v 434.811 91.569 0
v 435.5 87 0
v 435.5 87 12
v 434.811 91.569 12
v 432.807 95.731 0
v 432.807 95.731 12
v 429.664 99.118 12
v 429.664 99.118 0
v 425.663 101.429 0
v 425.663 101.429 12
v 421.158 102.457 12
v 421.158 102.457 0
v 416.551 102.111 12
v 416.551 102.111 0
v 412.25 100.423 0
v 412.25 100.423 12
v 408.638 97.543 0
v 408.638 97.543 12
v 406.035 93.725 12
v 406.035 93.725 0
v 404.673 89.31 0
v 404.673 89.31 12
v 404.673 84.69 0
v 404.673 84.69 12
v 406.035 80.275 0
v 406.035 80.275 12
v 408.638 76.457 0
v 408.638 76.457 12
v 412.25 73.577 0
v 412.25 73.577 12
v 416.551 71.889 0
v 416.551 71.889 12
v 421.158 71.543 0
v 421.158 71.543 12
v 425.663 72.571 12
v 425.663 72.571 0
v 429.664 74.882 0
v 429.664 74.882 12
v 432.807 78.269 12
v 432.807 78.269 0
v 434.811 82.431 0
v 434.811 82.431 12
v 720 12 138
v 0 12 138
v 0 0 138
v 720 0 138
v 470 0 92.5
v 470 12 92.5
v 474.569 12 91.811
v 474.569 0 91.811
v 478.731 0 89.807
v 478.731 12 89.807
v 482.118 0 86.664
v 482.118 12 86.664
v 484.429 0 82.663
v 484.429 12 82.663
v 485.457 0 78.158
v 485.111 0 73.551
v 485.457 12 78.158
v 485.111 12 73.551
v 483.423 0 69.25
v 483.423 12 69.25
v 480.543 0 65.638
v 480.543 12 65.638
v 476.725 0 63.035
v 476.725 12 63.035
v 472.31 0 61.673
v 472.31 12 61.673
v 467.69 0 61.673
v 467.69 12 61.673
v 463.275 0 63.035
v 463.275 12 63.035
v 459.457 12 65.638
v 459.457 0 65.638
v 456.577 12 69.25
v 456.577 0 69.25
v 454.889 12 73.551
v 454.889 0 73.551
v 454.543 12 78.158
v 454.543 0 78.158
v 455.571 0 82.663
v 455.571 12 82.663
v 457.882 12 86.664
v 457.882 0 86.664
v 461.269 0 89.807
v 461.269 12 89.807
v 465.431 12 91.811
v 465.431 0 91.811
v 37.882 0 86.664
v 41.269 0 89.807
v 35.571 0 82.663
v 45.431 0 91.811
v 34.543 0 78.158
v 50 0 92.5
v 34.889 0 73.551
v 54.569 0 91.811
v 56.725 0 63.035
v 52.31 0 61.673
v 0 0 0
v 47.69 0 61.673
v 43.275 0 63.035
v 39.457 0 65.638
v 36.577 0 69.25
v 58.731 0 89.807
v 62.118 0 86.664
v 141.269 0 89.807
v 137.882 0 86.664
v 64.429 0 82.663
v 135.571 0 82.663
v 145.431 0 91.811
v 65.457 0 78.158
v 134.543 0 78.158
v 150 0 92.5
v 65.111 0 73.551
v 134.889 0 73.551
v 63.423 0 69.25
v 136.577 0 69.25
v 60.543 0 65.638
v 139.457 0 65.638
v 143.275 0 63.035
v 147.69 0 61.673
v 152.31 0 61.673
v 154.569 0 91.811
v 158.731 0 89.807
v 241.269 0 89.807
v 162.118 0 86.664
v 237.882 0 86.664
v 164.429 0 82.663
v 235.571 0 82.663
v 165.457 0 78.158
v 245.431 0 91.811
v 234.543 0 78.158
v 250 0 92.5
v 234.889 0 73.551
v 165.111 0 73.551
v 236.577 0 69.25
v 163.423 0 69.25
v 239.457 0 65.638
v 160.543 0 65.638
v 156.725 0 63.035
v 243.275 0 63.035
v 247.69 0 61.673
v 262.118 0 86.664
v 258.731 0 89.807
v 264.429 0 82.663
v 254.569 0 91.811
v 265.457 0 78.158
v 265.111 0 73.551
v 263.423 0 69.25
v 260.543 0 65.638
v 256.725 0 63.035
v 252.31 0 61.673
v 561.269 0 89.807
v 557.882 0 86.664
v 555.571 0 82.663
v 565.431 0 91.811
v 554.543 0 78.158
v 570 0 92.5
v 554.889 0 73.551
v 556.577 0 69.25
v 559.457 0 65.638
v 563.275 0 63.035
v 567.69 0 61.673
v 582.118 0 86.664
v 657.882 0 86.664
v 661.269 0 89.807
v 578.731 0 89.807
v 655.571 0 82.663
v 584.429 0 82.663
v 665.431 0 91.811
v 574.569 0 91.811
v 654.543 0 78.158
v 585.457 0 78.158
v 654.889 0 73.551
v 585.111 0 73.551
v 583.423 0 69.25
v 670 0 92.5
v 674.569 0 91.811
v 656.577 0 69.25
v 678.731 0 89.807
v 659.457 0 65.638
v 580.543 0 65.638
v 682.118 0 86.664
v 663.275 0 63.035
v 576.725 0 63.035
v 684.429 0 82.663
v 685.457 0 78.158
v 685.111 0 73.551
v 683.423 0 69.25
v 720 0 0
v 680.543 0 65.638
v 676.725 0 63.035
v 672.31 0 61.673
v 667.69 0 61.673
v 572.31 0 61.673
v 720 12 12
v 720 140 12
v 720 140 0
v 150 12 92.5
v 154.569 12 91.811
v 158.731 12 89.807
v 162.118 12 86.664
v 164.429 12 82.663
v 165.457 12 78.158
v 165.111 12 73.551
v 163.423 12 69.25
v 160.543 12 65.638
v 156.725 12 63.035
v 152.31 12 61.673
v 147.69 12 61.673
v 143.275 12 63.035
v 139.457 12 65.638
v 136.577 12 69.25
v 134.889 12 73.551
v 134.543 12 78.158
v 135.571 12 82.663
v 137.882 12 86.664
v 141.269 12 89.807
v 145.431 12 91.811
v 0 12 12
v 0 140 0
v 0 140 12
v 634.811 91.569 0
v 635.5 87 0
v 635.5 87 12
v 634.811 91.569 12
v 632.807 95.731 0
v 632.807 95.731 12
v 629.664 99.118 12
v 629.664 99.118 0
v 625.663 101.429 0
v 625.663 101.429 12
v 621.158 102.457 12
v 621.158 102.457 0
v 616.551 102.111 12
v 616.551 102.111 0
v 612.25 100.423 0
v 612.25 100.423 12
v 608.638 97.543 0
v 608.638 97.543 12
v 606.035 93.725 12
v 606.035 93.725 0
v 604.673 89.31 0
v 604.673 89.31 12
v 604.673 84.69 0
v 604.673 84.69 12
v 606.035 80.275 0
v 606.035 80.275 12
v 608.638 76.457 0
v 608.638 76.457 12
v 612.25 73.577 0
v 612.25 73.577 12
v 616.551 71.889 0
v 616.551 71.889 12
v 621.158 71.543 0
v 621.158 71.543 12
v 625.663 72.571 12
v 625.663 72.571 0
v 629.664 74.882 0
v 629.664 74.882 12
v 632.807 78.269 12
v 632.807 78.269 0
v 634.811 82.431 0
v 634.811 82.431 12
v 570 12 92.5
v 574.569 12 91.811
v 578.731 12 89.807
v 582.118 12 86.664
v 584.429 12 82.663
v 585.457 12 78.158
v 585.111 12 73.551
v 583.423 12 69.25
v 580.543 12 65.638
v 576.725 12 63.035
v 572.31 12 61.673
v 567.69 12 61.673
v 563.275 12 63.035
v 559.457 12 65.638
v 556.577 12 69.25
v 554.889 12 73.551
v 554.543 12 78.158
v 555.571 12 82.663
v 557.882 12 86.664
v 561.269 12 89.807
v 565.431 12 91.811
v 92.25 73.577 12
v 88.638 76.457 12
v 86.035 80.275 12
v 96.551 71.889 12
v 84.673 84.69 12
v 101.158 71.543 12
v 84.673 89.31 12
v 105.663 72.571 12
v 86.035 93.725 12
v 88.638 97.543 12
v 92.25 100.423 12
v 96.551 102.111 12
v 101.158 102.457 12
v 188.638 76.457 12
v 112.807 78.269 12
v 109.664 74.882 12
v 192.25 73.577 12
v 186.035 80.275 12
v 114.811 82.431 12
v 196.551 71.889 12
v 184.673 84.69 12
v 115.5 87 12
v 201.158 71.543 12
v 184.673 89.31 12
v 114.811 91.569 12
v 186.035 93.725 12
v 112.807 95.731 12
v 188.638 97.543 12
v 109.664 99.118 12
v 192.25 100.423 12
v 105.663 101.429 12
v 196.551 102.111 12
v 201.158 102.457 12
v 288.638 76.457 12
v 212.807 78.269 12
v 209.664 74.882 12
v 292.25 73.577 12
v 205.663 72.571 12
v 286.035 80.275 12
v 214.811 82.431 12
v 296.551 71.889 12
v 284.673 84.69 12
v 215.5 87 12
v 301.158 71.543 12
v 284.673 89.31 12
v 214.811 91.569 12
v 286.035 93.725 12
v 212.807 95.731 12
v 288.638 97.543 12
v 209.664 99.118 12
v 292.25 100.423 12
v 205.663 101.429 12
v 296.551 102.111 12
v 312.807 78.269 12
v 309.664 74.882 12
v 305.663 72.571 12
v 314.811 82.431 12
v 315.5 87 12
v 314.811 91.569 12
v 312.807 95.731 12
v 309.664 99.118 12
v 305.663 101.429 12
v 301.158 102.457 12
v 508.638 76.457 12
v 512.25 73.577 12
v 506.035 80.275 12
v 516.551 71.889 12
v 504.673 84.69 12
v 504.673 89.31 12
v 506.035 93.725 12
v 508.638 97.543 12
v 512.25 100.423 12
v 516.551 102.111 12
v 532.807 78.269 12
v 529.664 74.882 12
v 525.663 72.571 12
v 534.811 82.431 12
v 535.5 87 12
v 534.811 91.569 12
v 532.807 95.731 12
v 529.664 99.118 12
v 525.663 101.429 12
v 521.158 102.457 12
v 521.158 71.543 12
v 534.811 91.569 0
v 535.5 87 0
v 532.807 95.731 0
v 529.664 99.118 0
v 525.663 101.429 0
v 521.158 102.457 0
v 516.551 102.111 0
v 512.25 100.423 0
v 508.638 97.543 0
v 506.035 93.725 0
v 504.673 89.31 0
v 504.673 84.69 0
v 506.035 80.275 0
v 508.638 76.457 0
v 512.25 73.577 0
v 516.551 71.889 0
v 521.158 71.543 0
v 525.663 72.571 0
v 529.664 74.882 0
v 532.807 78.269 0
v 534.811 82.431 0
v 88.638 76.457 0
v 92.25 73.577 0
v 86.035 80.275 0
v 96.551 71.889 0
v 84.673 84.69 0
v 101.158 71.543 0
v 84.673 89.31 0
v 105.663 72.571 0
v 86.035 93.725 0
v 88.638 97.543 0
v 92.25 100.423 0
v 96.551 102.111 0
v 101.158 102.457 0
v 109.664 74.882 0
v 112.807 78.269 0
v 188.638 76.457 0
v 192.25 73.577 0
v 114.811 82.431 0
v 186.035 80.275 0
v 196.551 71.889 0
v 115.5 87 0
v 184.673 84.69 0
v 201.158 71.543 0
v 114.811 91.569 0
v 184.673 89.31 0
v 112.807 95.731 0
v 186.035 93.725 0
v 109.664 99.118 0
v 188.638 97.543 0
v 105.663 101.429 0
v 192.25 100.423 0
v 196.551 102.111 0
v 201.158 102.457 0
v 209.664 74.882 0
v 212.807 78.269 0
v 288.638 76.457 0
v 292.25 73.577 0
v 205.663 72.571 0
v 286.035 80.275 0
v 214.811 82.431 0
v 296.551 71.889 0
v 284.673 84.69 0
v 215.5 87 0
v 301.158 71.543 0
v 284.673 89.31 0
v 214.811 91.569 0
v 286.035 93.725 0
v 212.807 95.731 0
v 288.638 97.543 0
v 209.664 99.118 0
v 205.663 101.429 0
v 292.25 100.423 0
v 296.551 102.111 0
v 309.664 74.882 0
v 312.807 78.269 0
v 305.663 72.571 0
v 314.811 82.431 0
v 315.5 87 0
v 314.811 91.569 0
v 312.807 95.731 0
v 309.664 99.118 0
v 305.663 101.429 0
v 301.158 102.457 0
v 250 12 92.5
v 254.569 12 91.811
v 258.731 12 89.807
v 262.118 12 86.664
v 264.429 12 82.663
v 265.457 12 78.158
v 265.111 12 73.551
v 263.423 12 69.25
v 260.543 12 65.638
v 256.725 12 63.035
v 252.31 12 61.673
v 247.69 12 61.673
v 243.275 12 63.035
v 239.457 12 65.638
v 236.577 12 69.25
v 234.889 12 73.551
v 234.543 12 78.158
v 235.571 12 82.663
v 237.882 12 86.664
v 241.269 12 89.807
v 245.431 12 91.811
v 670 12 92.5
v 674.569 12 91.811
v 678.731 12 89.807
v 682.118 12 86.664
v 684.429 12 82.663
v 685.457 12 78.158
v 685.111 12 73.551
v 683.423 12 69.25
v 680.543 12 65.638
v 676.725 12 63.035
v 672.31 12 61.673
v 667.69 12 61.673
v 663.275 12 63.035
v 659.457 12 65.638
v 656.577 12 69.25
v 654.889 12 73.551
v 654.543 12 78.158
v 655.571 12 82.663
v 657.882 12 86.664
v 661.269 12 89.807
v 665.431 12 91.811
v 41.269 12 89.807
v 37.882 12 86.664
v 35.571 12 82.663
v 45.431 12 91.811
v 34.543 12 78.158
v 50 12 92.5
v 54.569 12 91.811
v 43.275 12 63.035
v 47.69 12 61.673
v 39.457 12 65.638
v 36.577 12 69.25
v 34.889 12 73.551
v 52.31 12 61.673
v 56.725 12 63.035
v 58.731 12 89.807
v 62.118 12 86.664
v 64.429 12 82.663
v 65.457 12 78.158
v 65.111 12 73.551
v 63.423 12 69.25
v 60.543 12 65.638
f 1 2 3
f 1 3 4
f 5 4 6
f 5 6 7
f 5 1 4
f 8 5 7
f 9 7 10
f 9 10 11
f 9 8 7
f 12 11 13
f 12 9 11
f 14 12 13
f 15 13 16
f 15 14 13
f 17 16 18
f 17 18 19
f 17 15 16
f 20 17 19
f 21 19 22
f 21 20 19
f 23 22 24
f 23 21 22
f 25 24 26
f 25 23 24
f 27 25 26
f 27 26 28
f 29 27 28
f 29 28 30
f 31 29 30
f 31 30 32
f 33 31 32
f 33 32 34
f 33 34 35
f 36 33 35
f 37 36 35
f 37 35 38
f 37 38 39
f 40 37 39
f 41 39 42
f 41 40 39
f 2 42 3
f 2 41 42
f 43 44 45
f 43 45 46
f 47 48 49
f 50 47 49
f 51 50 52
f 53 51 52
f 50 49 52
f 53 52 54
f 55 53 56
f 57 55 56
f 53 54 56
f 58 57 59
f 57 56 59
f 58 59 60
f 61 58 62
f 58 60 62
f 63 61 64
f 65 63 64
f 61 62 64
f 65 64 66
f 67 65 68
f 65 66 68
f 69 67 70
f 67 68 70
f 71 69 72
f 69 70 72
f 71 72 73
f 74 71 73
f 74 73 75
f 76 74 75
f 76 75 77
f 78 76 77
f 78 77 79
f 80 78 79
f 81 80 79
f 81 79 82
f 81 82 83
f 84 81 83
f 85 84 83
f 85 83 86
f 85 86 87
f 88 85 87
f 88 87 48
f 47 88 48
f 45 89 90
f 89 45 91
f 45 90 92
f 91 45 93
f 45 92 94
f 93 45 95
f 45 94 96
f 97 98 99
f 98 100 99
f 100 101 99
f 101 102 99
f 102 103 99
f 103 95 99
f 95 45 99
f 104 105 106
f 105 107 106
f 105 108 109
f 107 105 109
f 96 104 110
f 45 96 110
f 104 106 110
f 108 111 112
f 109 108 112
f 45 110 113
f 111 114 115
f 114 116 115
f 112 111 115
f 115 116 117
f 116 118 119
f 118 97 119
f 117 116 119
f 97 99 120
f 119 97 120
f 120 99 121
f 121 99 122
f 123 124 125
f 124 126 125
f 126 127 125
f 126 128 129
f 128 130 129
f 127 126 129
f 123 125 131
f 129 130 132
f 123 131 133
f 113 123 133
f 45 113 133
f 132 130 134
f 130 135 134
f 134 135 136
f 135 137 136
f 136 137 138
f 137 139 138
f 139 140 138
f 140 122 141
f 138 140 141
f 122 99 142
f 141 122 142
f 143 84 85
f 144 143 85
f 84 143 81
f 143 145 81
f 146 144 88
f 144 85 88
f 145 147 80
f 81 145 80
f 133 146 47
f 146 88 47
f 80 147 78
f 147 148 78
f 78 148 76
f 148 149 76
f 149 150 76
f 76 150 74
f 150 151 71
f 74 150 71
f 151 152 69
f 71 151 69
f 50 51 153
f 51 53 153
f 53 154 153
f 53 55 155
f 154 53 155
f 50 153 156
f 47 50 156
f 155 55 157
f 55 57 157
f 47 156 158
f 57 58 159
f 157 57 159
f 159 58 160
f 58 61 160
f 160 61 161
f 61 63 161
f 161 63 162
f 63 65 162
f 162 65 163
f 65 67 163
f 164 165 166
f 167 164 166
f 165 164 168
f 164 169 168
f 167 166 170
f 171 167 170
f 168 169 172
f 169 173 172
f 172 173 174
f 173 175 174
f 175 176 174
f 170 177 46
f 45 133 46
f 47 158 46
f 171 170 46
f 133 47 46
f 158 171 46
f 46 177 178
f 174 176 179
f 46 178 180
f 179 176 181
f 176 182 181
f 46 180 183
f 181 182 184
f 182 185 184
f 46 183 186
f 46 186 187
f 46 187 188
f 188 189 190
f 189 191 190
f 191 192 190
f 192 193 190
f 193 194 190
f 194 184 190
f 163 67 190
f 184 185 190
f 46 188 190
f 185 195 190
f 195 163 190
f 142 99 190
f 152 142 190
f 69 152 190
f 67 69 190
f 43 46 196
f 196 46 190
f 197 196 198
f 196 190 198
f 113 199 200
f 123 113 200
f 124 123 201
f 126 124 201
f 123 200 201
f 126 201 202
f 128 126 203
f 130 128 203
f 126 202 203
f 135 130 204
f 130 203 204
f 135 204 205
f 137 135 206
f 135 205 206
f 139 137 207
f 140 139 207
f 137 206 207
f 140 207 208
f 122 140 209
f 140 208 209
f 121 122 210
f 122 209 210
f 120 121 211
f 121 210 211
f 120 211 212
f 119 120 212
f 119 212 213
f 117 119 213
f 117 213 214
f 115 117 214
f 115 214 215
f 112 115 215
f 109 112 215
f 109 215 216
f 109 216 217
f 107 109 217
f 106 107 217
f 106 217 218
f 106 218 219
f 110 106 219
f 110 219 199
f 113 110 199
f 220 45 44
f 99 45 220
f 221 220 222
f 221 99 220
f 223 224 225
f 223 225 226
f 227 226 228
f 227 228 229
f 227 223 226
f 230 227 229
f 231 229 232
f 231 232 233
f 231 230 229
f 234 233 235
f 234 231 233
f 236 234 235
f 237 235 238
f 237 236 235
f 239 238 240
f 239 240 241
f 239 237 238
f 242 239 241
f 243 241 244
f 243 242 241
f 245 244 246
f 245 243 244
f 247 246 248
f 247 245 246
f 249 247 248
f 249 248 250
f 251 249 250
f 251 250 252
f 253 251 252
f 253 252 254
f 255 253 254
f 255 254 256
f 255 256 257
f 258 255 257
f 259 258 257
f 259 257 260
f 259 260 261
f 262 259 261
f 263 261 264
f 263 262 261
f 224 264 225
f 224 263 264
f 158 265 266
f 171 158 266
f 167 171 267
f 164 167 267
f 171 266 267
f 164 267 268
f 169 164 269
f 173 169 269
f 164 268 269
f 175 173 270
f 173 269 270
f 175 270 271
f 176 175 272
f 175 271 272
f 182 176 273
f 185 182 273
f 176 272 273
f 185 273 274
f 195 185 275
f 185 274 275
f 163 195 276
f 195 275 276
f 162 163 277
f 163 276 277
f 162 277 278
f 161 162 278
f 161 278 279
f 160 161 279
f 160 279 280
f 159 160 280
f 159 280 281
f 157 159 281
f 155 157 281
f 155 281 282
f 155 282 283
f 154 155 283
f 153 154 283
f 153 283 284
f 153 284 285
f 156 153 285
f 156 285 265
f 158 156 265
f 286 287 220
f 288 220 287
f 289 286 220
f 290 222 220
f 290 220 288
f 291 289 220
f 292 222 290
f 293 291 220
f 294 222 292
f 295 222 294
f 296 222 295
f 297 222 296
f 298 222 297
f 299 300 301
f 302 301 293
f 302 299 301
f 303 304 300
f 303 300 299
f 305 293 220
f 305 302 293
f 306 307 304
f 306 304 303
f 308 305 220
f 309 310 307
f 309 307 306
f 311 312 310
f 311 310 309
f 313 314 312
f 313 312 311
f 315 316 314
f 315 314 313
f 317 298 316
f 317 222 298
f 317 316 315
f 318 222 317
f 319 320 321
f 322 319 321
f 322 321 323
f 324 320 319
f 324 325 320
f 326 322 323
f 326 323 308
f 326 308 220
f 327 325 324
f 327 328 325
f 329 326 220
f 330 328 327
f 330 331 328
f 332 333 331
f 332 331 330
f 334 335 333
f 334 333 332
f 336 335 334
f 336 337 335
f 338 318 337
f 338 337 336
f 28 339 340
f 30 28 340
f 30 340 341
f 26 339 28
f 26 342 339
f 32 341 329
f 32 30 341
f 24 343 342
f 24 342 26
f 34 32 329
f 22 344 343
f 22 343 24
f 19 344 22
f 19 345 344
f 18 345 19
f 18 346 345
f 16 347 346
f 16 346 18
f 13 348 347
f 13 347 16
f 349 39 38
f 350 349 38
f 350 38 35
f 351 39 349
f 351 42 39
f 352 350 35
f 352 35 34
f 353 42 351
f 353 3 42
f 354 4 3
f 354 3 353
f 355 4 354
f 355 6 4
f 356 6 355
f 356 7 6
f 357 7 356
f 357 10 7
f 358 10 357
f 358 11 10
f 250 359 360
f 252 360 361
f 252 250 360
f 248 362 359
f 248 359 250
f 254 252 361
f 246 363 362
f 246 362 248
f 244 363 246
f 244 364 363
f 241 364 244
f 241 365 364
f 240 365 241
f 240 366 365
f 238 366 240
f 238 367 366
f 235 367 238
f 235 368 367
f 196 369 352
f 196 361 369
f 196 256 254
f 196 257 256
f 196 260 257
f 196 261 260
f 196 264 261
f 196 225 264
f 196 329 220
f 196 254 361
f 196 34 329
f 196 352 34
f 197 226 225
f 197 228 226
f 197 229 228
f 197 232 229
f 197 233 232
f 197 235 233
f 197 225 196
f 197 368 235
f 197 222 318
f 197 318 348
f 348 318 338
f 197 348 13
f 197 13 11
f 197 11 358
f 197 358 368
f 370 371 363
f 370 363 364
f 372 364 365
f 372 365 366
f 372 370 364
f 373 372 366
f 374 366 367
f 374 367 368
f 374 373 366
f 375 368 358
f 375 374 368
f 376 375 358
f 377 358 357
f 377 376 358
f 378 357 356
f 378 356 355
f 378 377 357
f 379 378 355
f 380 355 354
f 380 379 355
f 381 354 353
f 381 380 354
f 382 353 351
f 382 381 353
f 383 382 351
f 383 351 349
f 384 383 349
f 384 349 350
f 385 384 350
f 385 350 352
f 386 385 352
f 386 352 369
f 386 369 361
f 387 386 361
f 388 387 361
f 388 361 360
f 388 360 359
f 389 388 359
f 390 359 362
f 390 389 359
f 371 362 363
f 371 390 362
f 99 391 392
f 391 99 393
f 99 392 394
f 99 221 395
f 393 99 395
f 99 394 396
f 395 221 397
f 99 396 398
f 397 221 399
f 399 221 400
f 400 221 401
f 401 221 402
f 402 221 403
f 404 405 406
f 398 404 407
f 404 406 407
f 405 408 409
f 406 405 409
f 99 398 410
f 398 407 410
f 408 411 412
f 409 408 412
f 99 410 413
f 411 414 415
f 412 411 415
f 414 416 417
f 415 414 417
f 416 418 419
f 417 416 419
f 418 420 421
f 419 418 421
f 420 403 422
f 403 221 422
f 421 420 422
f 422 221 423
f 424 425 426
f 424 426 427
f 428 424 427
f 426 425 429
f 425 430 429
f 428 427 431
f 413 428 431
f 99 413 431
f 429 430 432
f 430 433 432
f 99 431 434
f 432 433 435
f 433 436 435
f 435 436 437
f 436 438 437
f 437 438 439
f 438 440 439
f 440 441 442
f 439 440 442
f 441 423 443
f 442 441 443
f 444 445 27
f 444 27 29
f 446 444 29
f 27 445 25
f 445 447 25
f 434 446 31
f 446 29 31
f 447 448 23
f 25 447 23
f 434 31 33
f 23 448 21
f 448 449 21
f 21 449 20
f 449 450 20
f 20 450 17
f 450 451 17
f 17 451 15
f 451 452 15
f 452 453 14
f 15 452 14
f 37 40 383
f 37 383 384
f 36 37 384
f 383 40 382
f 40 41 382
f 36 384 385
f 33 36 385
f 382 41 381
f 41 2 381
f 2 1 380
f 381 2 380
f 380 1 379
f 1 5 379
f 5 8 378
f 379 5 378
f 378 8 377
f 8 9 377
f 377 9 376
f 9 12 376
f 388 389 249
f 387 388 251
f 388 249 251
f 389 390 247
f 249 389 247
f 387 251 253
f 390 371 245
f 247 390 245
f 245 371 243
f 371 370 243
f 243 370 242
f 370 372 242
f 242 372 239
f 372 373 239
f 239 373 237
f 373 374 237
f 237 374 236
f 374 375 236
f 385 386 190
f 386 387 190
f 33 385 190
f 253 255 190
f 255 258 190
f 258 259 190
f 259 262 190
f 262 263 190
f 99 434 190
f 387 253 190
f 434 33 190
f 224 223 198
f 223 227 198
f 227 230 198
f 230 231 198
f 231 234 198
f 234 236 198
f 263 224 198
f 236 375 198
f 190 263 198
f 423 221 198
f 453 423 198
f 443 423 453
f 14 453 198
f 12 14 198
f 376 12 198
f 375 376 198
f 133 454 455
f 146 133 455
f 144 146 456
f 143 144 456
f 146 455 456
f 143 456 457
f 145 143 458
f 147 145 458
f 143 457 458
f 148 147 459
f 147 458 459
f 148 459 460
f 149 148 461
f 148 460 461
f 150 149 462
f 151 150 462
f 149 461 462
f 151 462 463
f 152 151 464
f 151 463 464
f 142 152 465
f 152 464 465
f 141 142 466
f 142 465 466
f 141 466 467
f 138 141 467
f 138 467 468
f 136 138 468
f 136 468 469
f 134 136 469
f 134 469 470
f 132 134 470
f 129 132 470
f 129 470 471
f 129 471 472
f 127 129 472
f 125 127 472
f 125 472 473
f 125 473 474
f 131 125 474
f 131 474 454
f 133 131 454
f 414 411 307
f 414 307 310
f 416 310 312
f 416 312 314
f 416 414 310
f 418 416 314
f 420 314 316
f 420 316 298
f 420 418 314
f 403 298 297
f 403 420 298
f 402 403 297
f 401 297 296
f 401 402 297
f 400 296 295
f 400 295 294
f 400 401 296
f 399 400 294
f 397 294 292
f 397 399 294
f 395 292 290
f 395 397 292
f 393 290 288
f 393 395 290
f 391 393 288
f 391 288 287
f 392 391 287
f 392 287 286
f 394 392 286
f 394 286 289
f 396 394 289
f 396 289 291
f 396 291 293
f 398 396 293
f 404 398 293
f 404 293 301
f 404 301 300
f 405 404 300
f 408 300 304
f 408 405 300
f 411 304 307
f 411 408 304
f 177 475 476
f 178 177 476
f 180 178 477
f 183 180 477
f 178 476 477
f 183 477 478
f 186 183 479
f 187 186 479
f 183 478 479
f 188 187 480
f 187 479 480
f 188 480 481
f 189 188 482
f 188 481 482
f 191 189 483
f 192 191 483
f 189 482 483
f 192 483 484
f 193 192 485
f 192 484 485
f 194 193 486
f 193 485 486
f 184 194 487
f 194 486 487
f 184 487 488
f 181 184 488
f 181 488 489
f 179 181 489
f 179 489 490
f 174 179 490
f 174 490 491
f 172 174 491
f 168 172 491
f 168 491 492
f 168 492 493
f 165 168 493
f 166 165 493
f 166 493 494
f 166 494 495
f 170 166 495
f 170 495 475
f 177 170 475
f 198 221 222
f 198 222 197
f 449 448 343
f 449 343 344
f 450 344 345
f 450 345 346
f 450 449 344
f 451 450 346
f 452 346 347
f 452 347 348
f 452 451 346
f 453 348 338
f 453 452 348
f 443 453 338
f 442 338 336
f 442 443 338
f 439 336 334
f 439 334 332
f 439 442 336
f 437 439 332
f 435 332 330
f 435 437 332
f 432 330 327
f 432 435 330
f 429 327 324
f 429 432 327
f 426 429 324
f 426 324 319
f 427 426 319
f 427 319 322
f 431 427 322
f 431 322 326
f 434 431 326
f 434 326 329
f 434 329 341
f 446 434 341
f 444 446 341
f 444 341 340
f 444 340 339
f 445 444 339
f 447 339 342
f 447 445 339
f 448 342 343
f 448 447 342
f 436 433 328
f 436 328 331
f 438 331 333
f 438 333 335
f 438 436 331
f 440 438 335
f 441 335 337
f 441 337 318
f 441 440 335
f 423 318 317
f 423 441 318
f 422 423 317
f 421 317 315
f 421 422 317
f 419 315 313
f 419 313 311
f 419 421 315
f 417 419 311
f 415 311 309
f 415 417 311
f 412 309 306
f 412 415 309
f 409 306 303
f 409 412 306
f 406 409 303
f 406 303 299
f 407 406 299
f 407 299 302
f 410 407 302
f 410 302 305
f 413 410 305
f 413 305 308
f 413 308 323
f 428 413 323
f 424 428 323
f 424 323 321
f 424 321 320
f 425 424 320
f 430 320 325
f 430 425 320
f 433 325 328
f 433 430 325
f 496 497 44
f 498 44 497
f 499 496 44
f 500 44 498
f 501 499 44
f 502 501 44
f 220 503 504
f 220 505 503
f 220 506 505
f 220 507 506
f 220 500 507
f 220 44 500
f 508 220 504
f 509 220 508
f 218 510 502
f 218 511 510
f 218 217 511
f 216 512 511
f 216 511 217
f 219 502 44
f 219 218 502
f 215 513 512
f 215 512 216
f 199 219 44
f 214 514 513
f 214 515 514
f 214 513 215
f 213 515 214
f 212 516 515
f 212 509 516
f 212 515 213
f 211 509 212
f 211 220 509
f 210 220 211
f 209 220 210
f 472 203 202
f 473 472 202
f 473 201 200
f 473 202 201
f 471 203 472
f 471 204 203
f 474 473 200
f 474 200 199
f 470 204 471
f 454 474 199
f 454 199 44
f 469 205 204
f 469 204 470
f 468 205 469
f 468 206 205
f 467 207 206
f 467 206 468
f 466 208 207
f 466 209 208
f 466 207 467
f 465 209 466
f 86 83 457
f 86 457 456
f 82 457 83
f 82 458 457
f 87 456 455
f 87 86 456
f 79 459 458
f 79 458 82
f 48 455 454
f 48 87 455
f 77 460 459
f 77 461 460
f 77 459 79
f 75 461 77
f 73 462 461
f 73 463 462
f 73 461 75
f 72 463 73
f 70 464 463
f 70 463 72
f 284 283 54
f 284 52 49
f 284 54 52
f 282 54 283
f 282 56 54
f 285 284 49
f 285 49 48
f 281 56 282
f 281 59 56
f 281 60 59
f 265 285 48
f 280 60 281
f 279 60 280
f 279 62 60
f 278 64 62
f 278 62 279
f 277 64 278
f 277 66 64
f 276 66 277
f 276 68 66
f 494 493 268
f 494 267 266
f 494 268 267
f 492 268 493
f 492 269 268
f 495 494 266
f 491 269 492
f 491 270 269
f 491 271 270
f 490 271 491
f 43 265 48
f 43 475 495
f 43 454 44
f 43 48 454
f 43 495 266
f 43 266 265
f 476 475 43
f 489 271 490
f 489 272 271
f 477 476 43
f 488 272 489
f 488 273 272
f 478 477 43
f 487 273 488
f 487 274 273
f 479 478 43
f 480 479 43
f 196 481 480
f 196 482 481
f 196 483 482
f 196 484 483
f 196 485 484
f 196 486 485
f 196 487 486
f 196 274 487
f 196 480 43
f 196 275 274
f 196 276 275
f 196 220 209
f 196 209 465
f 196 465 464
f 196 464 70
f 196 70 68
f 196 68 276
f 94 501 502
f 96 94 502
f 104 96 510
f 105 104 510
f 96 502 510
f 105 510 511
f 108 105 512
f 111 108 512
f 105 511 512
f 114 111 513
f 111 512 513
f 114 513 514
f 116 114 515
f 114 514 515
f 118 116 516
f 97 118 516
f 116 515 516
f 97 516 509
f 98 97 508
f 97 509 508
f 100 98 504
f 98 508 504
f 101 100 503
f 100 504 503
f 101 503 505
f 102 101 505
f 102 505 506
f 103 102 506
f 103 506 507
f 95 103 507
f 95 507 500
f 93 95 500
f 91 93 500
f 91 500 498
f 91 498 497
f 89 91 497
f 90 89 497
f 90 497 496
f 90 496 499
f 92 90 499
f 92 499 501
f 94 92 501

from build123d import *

# Parameters (mm, degrees)
SKETCH1_W      = 720
SKETCH1_H      = 140
SKETCH1_R      = 15.5
EXTRUDE1_DEPTH = 12
SKETCH2_W      = 720
SKETCH2_H      = 12
EXTRUDE2_DEPTH = 126
SKETCH3_R      = 15.5
EXTRUDE3_DEPTH = 168


with BuildPart() as part:
    # Sketch1 → Extrude1 (new body)
    with BuildSketch(Plane.XY):
        with Locations((360, 70)):
            Rectangle(SKETCH1_W, SKETCH1_H)
        with Locations((100, 87)):
            Circle(SKETCH1_R, mode=Mode.SUBTRACT)
        with Locations((200, 87)):
            Circle(SKETCH1_R, mode=Mode.SUBTRACT)
        with Locations((300, 87)):
            Circle(SKETCH1_R, mode=Mode.SUBTRACT)
        with Locations((520, 87)):
            Circle(SKETCH1_R, mode=Mode.SUBTRACT)
        with Locations((620, 87)):
            Circle(SKETCH1_R, mode=Mode.SUBTRACT)
        with Locations((420, 87)):
            Circle(SKETCH1_R, mode=Mode.SUBTRACT)
    extrude(amount=EXTRUDE1_DEPTH)

    # Sketch2 → Extrude2 (add)
    with BuildSketch(Plane.XY.offset(12)):
        with Locations((360, 6)):
            Rectangle(SKETCH2_W, SKETCH2_H)
    extrude(amount=EXTRUDE2_DEPTH)

    # Sketch3 → Extrude3 (cut)
    with BuildSketch(Plane(origin=(0, 12, 0), x_dir=(1, 0, 0), z_dir=(0, 1, 0))):
        with Locations(Location((50, -77, 0), (0, 0, 270))):
            Circle(SKETCH3_R)
        with Locations(Location((150, -77, 0), (0, 0, 270))):
            Circle(SKETCH3_R)
        with Locations(Location((250, -77, 0), (0, 0, 270))):
            Circle(SKETCH3_R)
        with Locations(Location((670, -77, 0), (0, 0, 270))):
            Circle(SKETCH3_R)
        with Locations(Location((470, -77, 0), (0, 0, 270))):
            Circle(SKETCH3_R)
        with Locations(Location((570, -77, 0), (0, 0, 270))):
            Circle(SKETCH3_R)
    extrude(amount=-EXTRUDE3_DEPTH, mode=Mode.SUBTRACT)


solid = part.part
